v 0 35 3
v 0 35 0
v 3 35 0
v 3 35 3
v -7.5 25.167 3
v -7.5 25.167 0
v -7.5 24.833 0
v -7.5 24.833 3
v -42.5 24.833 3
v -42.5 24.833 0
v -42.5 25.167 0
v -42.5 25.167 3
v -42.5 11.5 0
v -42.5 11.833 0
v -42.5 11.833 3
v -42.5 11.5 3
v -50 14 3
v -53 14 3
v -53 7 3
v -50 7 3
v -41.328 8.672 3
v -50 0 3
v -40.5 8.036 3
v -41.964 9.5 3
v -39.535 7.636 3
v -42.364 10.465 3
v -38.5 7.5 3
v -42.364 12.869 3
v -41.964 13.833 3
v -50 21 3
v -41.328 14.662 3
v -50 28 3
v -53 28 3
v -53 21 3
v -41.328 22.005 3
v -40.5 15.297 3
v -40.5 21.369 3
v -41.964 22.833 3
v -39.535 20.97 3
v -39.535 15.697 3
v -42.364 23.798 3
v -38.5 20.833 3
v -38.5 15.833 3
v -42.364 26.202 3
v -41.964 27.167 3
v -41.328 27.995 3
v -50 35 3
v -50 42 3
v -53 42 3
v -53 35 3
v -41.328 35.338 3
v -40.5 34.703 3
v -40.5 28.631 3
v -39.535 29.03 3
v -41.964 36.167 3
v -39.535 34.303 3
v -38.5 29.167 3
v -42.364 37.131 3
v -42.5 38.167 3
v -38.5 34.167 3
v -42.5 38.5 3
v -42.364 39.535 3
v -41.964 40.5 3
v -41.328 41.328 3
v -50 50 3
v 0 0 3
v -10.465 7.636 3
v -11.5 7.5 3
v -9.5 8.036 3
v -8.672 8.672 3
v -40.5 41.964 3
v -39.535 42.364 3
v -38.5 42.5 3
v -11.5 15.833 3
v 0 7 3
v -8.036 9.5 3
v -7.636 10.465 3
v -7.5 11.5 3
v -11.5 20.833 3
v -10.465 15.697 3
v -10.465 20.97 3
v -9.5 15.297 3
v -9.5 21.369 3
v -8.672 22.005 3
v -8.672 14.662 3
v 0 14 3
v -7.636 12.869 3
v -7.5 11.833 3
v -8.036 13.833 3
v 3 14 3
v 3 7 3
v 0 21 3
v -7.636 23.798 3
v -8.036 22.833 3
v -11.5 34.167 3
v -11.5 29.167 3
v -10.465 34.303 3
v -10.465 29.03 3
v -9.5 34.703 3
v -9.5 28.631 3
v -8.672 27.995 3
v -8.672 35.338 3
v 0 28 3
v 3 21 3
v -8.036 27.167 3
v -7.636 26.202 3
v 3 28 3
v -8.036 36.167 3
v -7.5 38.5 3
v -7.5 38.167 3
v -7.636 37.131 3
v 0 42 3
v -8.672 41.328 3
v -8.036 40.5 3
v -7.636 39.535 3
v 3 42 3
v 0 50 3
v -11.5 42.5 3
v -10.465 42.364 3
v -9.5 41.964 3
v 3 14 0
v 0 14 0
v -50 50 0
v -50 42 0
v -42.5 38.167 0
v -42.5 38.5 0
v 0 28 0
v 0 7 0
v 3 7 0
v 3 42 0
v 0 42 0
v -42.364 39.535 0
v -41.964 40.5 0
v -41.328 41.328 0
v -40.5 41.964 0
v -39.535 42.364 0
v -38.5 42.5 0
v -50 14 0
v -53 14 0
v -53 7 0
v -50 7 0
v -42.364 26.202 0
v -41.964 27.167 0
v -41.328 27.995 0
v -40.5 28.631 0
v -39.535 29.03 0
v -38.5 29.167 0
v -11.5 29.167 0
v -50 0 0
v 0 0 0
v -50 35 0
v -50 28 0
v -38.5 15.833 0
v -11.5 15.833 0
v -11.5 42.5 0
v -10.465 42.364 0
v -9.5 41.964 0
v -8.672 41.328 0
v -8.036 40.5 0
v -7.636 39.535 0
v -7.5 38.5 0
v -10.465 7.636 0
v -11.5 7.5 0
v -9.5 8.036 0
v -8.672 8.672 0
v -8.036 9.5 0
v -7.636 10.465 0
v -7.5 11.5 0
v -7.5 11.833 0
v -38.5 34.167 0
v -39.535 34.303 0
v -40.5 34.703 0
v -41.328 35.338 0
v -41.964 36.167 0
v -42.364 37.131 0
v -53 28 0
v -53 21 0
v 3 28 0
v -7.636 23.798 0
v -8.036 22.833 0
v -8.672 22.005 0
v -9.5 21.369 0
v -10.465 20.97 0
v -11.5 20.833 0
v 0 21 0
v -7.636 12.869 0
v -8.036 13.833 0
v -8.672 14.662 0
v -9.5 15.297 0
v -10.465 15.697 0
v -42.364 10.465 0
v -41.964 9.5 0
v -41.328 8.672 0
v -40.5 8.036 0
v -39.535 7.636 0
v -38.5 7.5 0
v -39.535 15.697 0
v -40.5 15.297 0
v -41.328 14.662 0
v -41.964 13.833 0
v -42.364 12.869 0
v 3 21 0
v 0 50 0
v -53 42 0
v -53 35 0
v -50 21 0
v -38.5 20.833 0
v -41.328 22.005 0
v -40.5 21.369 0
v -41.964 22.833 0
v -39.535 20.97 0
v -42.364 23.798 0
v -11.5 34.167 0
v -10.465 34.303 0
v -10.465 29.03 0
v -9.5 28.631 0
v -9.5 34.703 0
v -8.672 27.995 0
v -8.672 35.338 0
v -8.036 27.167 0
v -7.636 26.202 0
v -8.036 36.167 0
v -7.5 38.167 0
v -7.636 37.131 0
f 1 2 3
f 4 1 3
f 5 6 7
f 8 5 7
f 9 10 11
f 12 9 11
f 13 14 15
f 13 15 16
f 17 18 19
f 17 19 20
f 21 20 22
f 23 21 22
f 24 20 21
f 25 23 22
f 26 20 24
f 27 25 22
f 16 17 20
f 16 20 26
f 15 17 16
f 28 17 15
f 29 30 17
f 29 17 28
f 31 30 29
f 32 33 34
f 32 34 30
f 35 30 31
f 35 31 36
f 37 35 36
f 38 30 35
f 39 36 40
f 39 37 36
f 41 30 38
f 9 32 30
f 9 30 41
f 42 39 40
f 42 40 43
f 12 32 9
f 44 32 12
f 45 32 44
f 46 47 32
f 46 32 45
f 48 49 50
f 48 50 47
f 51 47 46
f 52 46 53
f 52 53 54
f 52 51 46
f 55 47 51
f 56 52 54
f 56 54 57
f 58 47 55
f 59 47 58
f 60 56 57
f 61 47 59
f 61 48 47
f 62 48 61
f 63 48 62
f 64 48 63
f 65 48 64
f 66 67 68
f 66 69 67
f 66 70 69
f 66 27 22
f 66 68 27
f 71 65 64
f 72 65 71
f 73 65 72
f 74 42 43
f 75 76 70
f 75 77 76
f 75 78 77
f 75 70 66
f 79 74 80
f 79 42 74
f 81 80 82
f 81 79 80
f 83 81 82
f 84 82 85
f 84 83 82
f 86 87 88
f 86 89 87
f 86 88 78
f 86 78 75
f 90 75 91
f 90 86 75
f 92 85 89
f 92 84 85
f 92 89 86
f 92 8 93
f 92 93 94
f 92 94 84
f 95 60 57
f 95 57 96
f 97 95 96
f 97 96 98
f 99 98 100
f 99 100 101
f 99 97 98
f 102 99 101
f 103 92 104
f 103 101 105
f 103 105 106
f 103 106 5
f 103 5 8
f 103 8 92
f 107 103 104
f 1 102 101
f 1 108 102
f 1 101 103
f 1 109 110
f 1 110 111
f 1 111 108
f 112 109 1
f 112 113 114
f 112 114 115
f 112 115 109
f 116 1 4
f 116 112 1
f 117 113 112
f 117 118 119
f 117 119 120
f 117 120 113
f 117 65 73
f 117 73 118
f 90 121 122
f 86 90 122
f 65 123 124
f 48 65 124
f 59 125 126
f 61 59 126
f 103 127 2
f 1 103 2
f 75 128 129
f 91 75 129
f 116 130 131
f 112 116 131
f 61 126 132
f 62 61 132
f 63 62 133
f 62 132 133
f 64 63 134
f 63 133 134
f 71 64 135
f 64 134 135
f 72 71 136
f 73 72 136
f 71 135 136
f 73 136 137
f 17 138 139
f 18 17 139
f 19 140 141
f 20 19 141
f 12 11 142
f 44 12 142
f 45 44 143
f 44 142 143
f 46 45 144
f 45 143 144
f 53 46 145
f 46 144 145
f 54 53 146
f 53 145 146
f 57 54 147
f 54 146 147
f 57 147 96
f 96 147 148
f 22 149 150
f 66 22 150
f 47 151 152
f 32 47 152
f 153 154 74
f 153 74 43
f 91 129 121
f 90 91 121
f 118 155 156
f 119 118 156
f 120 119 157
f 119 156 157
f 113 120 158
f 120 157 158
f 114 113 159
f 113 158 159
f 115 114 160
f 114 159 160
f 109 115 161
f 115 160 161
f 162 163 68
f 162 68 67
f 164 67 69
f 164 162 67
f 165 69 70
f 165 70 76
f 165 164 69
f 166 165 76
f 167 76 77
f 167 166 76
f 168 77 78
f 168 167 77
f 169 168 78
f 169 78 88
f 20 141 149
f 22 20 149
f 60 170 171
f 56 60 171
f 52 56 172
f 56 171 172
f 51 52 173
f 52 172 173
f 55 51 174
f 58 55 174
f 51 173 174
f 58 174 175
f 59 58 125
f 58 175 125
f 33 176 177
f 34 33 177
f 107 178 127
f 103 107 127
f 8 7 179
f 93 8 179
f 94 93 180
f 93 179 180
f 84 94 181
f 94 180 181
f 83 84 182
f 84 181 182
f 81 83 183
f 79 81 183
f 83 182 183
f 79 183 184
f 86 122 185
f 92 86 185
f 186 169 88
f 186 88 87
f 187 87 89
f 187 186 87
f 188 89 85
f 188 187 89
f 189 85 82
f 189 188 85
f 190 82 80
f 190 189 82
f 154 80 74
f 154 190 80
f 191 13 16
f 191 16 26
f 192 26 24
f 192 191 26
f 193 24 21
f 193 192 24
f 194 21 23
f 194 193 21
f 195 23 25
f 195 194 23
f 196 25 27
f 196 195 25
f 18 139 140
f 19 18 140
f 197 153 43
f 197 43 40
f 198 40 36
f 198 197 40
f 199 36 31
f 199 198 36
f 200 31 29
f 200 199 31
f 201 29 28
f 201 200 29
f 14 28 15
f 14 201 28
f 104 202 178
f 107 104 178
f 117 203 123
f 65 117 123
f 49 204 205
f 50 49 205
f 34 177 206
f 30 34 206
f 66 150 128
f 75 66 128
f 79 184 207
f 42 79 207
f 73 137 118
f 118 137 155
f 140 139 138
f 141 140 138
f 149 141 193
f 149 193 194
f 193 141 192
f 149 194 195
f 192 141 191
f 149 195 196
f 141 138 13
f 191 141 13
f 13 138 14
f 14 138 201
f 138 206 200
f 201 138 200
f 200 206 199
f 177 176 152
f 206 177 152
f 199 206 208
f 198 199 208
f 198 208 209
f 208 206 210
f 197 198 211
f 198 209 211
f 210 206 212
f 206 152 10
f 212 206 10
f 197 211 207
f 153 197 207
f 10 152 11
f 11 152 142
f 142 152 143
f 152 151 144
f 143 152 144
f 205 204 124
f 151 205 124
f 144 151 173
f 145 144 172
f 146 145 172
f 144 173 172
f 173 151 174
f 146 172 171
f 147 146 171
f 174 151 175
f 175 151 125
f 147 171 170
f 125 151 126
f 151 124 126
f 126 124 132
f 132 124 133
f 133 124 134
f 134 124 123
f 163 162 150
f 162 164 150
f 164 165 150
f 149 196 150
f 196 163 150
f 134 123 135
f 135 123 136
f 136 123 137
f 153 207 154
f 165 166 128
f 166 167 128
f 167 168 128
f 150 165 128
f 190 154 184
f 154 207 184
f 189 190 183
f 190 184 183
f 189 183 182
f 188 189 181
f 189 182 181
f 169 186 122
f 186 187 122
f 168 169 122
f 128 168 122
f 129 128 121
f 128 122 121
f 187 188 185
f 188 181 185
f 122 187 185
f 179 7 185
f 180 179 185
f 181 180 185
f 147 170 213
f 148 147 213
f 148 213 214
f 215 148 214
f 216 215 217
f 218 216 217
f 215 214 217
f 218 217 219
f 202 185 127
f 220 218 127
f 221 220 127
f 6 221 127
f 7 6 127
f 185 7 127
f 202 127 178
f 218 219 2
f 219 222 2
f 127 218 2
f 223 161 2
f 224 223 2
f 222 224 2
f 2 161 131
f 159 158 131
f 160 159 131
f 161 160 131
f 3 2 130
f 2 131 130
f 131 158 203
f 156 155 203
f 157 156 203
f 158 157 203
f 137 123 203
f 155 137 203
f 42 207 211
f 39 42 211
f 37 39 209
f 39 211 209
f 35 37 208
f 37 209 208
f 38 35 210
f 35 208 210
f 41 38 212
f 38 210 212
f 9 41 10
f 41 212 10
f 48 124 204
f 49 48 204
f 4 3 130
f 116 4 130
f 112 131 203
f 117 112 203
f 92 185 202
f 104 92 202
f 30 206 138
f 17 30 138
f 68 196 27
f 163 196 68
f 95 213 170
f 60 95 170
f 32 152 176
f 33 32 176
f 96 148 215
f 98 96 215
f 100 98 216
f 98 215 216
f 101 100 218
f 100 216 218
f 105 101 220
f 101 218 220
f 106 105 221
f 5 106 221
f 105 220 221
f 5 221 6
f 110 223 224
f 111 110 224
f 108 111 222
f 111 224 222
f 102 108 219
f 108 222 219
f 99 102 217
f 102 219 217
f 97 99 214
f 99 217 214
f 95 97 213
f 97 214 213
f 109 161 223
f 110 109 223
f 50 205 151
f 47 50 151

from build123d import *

# Parameters (mm, degrees)
BOSS_EXTRUDE1_DEPTH = 3


with BuildPart() as part:
    # Sketch1 → Boss-Extrude1 (new body)
    with BuildSketch(Plane.XY):
        Polygon((0, 0), (0, 7), (3, 7), (3, 14), (0, 14), (0, 21), (3, 21), (3, 28), (0, 28), (0, 35), (3, 35), (3, 42), (0, 42), (0, 50), (-50, 50), (-50, 42), (-53, 42), (-53, 35), (-50, 35), (-50, 28), (-53, 28), (-53, 21), (-50, 21), (-50, 14), (-53, 14), (-53, 7), (-50, 7), (-50, 0), align=None)
        with BuildLine():
            Line((-38.5, 42.5), (-11.5, 42.5))
            ThreePointArc((-11.5, 42.5), (-8.671572875, 41.328427125), (-7.5, 38.5))
            Line((-7.5, 38.5), (-7.5, 38.166666667))
            ThreePointArc((-7.5, 38.166666667), (-8.671572875, 35.338239542), (-11.5, 34.166666667))
            Line((-11.5, 34.166666667), (-38.5, 34.166666667))
            ThreePointArc((-38.5, 34.166666667), (-41.328427125, 35.338239542), (-42.5, 38.166666667))
            Line((-42.5, 38.166666667), (-42.5, 38.5))
            ThreePointArc((-42.5, 38.5), (-41.328427125, 41.328427125), (-38.5, 42.5))
        make_face(mode=Mode.SUBTRACT)
        with BuildLine():
            Line((-38.5, 29.166666667), (-11.5, 29.166666667))
            ThreePointArc((-11.5, 29.166666667), (-8.671572875, 27.995093791), (-7.5, 25.166666667))
            Line((-7.5, 25.166666667), (-7.5, 24.833333333))
            ThreePointArc((-7.5, 24.833333333), (-8.671572875, 22.004906209), (-11.5, 20.833333333))
            Line((-11.5, 20.833333333), (-38.5, 20.833333333))
            ThreePointArc((-38.5, 20.833333333), (-41.328427125, 22.004906209), (-42.5, 24.833333333))
            Line((-42.5, 24.833333333), (-42.5, 25.166666667))
            ThreePointArc((-42.5, 25.166666667), (-41.328427125, 27.995093791), (-38.5, 29.166666667))
        make_face(mode=Mode.SUBTRACT)
        with BuildLine():
            Line((-11.5, 15.833333333), (-38.5, 15.833333333))
            ThreePointArc((-38.5, 15.833333333), (-41.328427125, 14.661760458), (-42.5, 11.833333333))
            Line((-42.5, 11.833333333), (-42.5, 11.5))
            ThreePointArc((-42.5, 11.5), (-41.328427125, 8.671572875), (-38.5, 7.5))
            Line((-38.5, 7.5), (-11.5, 7.5))
            ThreePointArc((-11.5, 7.5), (-8.671572875, 8.671572875), (-7.5, 11.5))
            Line((-7.5, 11.5), (-7.5, 11.833333333))
            ThreePointArc((-7.5, 11.833333333), (-8.671572875, 14.661760458), (-11.5, 15.833333333))
        make_face(mode=Mode.SUBTRACT)
    extrude(amount=BOSS_EXTRUDE1_DEPTH)


solid = part.part
